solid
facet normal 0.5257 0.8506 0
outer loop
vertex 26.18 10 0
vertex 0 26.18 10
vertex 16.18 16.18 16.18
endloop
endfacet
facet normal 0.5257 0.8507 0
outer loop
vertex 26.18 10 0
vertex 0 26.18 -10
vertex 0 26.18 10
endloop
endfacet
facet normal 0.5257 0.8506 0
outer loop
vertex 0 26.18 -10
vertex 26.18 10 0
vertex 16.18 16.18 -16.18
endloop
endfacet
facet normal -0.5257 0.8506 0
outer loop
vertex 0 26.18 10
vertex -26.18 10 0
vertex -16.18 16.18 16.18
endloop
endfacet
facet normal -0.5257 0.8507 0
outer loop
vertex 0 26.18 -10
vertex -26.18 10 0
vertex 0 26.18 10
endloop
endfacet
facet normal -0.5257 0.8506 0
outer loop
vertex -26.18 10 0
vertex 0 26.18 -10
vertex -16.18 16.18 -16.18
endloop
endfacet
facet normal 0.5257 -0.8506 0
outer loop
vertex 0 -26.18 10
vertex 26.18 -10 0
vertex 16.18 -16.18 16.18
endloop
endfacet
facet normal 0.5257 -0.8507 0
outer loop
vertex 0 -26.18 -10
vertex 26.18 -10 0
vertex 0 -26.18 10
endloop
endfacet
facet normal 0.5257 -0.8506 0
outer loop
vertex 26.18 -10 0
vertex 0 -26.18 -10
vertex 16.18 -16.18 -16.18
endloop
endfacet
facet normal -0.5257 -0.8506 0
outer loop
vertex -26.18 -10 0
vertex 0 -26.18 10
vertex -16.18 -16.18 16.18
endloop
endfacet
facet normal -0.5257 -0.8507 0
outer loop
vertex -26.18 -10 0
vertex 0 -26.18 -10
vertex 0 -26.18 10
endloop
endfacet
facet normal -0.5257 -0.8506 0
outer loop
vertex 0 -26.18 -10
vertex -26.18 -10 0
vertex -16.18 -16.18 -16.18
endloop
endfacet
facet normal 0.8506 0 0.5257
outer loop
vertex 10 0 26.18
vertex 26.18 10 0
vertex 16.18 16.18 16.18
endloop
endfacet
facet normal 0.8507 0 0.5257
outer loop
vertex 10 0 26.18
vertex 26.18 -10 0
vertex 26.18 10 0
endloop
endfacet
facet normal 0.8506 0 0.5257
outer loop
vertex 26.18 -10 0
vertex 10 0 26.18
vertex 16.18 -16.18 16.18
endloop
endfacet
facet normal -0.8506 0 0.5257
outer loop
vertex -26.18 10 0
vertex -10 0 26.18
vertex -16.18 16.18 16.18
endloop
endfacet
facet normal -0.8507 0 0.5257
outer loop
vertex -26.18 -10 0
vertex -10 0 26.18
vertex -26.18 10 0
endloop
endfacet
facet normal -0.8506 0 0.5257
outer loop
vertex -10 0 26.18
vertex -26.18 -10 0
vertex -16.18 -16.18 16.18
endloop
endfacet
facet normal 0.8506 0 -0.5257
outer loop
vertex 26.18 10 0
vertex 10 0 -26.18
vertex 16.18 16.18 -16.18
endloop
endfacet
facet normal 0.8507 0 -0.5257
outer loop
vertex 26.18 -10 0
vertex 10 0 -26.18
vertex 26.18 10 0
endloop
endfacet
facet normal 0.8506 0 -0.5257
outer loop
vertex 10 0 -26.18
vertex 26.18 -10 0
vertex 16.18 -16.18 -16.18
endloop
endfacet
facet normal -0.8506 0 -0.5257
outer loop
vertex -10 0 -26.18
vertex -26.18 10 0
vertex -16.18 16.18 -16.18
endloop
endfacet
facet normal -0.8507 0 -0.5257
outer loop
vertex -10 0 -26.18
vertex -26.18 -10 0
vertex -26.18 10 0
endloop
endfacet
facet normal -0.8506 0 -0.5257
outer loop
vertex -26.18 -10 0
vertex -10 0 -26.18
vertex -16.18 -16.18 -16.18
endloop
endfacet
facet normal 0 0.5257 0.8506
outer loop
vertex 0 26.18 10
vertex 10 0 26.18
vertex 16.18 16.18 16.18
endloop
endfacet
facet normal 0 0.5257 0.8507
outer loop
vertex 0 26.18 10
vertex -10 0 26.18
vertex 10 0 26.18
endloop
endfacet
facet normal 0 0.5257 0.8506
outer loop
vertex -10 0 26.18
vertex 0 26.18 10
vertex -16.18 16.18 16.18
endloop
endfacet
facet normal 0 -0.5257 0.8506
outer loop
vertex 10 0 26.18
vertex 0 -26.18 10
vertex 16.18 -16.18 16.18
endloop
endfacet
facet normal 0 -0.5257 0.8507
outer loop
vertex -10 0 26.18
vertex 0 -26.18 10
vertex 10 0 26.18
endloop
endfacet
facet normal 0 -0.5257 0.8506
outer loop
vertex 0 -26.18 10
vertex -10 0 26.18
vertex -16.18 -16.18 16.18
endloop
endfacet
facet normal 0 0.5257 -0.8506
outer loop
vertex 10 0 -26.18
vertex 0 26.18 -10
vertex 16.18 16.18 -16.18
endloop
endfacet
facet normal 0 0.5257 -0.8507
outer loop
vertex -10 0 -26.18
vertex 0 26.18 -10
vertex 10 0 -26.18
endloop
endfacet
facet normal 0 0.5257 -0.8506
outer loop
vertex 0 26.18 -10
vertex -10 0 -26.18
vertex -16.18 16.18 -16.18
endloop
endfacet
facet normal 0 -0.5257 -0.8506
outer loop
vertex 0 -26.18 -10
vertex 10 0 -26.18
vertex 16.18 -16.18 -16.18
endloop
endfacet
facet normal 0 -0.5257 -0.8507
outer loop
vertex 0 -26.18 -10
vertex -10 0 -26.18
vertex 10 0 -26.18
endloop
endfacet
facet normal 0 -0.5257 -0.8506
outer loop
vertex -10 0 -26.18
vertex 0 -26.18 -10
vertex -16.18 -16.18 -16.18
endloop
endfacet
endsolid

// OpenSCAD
// Dodecahedron
// (C) @oblomobka - 2023.03
// GPL license

/* **CUSTOMIZER VARIABLES** */
// Edge
edge=20; //[10:100]
// Center of the solid or stand over a face
position = "Center"; //["Center", "Face"]

/* **MODULES** */
module Dodecahedron(edge=20, position="Face"){ 
    // Constants
    phi = (1+sqrt(5))/2; // Golden ratio = 1,618...
    
    // Invariants
    diAngleDodecahedron = acos(-1/sqrt(5))/*atan(1/phi)*/; // dihedral angle of Dodecahedron = 116,56505...
    
    // Relations
    rCirDodecahedron = sqrt(3)*phi/2; // Radius of a circumscribed sphere for edge = 1 / =1,401...
    rInsDodecahedron = phi^2/(2*sqrt(3-phi)); // radius of a inscribed sphere for edge = 1 / =1,1135...
    rMidDodecahedron = phi^2/2; // Midradius, which touches the middle of each edge / =1,309...
    
    // Variables
    diagonal=phi; // x depicts the edge of cube inscrit in the dodecahedron, that is the lenght of the diagonal of regular pentagon
    a = edge*diagonal/2; // to depicts the coordinates of cube inscrit in a pentagon center in (0,0,0) - 8 vertices
    // Even permutations (+-phi, +-1/phi, 0) for the inscrit cube (+-1, +-1, +-1) / ratio longside/shortside = phi:(1/phi) -> phi^2
    b = (edge*phi^2)/2;     // long side of the rectangle - equivalente to phi
    c = edge/2;             // short side of the rectangle - equivalente to 1/phi
    
    /*Generalization for no regular dodecahedrons
    Even permutations (+-(1+h), +-(1-h^2), 0)
    a = 1;
    h = 1/phi;     // h = 0     -> cube 
                   // h = 1/2   -> pyritohedron  
                   // h = 1/phi -> regular dodecahedron 
                   // h = 1     -> Rhombic dodecahedron
    b = (1+h);     // long side of the rectangle - equivalente to phi
    c = (1-h^2);   // short side of the rectangle - equivalente to 1/phi*/
    
    // Definition of points and faces V = 20 / F = 12
    Dpoints = [
        // Build the cube inscrit in the Dodecahedron
        [+a, +a, +a],[-a, +a, +a],[+a, -a, +a],[-a, -a, +a],    // UP       [  0,  1,  2,  3]
        [+a, +a, -a],[-a, +a, -a],[+a, -a, -a],[-a, -a, -a],    // DOWN     [  4,  5,  6,  7]
        // Even permutations, every line draw a rectangule
        [+b, +c, 0], [-b, +c, 0], [+b, -c, 0], [-b, -c, 0],     // XY       [  8,  9, 10, 11]
        [+c, 0, +b], [+c, 0, -b], [-c, 0, +b], [-c, 0, -b],     // XZ       [ 12, 13, 14, 15]
        [0, +b, +c], [0, -b, +c], [0, +b, -c], [0, -b, -c]      // YZ       [ 16, 17, 18, 19]
        ];
         
    Dfaces = [
        [  0, 16, 18,  4,  8], [  1,  9,  5, 18, 16], [  2, 10,  6, 19, 17], [  3, 17, 19,  7, 11],  // Edges XY
        [  0,  8, 10,  2, 12], [  1, 14,  3, 11,  9], [  4, 13,  6, 10,  8], [  5,  9, 11,  7, 15],  // Edges XZ
        [  0, 12, 14,  1, 16], [  2, 17,  3, 14, 12], [  4, 18,  5, 15, 13], [  6, 13, 15,  7, 19]   // Edges YZ
        ];
        
    AuxCube =    [[0,1,3,2],[4,6,7,5]];
    AuxDiedro =  [[8,9,11,10],[12,13,15,14],[16,17,19,18]];
    
    // Polyhedron stands on xy plane centered on the center of the face or centered on the center of polyhedron
    if(position=="Face"){
        translate([0,0,edge*rInsDodecahedron])
            rotate([90-diAngleDodecahedron/2, 0, 0])
                    polyhedron(Dpoints,Dfaces);}
    else if(position=="Center") {
        //polyhedron(Dpoints,AuxDiedro);
        //color("orange", 0.3){polyhedron(Dpoints,AuxCube);}
        //color("grey", 1){
            polyhedron(Dpoints,Dfaces);
            //}        
        } 
}

/* **RENDERING** */
//difference(){
    //translate ([0,0,20]) { sphere(r = 20); }
    Dodecahedron(edge=edge, position=position);
    //cube([30,30,30], center = true);
    //translate ([0,0,20]) { sphere(r = 30); }
//}
